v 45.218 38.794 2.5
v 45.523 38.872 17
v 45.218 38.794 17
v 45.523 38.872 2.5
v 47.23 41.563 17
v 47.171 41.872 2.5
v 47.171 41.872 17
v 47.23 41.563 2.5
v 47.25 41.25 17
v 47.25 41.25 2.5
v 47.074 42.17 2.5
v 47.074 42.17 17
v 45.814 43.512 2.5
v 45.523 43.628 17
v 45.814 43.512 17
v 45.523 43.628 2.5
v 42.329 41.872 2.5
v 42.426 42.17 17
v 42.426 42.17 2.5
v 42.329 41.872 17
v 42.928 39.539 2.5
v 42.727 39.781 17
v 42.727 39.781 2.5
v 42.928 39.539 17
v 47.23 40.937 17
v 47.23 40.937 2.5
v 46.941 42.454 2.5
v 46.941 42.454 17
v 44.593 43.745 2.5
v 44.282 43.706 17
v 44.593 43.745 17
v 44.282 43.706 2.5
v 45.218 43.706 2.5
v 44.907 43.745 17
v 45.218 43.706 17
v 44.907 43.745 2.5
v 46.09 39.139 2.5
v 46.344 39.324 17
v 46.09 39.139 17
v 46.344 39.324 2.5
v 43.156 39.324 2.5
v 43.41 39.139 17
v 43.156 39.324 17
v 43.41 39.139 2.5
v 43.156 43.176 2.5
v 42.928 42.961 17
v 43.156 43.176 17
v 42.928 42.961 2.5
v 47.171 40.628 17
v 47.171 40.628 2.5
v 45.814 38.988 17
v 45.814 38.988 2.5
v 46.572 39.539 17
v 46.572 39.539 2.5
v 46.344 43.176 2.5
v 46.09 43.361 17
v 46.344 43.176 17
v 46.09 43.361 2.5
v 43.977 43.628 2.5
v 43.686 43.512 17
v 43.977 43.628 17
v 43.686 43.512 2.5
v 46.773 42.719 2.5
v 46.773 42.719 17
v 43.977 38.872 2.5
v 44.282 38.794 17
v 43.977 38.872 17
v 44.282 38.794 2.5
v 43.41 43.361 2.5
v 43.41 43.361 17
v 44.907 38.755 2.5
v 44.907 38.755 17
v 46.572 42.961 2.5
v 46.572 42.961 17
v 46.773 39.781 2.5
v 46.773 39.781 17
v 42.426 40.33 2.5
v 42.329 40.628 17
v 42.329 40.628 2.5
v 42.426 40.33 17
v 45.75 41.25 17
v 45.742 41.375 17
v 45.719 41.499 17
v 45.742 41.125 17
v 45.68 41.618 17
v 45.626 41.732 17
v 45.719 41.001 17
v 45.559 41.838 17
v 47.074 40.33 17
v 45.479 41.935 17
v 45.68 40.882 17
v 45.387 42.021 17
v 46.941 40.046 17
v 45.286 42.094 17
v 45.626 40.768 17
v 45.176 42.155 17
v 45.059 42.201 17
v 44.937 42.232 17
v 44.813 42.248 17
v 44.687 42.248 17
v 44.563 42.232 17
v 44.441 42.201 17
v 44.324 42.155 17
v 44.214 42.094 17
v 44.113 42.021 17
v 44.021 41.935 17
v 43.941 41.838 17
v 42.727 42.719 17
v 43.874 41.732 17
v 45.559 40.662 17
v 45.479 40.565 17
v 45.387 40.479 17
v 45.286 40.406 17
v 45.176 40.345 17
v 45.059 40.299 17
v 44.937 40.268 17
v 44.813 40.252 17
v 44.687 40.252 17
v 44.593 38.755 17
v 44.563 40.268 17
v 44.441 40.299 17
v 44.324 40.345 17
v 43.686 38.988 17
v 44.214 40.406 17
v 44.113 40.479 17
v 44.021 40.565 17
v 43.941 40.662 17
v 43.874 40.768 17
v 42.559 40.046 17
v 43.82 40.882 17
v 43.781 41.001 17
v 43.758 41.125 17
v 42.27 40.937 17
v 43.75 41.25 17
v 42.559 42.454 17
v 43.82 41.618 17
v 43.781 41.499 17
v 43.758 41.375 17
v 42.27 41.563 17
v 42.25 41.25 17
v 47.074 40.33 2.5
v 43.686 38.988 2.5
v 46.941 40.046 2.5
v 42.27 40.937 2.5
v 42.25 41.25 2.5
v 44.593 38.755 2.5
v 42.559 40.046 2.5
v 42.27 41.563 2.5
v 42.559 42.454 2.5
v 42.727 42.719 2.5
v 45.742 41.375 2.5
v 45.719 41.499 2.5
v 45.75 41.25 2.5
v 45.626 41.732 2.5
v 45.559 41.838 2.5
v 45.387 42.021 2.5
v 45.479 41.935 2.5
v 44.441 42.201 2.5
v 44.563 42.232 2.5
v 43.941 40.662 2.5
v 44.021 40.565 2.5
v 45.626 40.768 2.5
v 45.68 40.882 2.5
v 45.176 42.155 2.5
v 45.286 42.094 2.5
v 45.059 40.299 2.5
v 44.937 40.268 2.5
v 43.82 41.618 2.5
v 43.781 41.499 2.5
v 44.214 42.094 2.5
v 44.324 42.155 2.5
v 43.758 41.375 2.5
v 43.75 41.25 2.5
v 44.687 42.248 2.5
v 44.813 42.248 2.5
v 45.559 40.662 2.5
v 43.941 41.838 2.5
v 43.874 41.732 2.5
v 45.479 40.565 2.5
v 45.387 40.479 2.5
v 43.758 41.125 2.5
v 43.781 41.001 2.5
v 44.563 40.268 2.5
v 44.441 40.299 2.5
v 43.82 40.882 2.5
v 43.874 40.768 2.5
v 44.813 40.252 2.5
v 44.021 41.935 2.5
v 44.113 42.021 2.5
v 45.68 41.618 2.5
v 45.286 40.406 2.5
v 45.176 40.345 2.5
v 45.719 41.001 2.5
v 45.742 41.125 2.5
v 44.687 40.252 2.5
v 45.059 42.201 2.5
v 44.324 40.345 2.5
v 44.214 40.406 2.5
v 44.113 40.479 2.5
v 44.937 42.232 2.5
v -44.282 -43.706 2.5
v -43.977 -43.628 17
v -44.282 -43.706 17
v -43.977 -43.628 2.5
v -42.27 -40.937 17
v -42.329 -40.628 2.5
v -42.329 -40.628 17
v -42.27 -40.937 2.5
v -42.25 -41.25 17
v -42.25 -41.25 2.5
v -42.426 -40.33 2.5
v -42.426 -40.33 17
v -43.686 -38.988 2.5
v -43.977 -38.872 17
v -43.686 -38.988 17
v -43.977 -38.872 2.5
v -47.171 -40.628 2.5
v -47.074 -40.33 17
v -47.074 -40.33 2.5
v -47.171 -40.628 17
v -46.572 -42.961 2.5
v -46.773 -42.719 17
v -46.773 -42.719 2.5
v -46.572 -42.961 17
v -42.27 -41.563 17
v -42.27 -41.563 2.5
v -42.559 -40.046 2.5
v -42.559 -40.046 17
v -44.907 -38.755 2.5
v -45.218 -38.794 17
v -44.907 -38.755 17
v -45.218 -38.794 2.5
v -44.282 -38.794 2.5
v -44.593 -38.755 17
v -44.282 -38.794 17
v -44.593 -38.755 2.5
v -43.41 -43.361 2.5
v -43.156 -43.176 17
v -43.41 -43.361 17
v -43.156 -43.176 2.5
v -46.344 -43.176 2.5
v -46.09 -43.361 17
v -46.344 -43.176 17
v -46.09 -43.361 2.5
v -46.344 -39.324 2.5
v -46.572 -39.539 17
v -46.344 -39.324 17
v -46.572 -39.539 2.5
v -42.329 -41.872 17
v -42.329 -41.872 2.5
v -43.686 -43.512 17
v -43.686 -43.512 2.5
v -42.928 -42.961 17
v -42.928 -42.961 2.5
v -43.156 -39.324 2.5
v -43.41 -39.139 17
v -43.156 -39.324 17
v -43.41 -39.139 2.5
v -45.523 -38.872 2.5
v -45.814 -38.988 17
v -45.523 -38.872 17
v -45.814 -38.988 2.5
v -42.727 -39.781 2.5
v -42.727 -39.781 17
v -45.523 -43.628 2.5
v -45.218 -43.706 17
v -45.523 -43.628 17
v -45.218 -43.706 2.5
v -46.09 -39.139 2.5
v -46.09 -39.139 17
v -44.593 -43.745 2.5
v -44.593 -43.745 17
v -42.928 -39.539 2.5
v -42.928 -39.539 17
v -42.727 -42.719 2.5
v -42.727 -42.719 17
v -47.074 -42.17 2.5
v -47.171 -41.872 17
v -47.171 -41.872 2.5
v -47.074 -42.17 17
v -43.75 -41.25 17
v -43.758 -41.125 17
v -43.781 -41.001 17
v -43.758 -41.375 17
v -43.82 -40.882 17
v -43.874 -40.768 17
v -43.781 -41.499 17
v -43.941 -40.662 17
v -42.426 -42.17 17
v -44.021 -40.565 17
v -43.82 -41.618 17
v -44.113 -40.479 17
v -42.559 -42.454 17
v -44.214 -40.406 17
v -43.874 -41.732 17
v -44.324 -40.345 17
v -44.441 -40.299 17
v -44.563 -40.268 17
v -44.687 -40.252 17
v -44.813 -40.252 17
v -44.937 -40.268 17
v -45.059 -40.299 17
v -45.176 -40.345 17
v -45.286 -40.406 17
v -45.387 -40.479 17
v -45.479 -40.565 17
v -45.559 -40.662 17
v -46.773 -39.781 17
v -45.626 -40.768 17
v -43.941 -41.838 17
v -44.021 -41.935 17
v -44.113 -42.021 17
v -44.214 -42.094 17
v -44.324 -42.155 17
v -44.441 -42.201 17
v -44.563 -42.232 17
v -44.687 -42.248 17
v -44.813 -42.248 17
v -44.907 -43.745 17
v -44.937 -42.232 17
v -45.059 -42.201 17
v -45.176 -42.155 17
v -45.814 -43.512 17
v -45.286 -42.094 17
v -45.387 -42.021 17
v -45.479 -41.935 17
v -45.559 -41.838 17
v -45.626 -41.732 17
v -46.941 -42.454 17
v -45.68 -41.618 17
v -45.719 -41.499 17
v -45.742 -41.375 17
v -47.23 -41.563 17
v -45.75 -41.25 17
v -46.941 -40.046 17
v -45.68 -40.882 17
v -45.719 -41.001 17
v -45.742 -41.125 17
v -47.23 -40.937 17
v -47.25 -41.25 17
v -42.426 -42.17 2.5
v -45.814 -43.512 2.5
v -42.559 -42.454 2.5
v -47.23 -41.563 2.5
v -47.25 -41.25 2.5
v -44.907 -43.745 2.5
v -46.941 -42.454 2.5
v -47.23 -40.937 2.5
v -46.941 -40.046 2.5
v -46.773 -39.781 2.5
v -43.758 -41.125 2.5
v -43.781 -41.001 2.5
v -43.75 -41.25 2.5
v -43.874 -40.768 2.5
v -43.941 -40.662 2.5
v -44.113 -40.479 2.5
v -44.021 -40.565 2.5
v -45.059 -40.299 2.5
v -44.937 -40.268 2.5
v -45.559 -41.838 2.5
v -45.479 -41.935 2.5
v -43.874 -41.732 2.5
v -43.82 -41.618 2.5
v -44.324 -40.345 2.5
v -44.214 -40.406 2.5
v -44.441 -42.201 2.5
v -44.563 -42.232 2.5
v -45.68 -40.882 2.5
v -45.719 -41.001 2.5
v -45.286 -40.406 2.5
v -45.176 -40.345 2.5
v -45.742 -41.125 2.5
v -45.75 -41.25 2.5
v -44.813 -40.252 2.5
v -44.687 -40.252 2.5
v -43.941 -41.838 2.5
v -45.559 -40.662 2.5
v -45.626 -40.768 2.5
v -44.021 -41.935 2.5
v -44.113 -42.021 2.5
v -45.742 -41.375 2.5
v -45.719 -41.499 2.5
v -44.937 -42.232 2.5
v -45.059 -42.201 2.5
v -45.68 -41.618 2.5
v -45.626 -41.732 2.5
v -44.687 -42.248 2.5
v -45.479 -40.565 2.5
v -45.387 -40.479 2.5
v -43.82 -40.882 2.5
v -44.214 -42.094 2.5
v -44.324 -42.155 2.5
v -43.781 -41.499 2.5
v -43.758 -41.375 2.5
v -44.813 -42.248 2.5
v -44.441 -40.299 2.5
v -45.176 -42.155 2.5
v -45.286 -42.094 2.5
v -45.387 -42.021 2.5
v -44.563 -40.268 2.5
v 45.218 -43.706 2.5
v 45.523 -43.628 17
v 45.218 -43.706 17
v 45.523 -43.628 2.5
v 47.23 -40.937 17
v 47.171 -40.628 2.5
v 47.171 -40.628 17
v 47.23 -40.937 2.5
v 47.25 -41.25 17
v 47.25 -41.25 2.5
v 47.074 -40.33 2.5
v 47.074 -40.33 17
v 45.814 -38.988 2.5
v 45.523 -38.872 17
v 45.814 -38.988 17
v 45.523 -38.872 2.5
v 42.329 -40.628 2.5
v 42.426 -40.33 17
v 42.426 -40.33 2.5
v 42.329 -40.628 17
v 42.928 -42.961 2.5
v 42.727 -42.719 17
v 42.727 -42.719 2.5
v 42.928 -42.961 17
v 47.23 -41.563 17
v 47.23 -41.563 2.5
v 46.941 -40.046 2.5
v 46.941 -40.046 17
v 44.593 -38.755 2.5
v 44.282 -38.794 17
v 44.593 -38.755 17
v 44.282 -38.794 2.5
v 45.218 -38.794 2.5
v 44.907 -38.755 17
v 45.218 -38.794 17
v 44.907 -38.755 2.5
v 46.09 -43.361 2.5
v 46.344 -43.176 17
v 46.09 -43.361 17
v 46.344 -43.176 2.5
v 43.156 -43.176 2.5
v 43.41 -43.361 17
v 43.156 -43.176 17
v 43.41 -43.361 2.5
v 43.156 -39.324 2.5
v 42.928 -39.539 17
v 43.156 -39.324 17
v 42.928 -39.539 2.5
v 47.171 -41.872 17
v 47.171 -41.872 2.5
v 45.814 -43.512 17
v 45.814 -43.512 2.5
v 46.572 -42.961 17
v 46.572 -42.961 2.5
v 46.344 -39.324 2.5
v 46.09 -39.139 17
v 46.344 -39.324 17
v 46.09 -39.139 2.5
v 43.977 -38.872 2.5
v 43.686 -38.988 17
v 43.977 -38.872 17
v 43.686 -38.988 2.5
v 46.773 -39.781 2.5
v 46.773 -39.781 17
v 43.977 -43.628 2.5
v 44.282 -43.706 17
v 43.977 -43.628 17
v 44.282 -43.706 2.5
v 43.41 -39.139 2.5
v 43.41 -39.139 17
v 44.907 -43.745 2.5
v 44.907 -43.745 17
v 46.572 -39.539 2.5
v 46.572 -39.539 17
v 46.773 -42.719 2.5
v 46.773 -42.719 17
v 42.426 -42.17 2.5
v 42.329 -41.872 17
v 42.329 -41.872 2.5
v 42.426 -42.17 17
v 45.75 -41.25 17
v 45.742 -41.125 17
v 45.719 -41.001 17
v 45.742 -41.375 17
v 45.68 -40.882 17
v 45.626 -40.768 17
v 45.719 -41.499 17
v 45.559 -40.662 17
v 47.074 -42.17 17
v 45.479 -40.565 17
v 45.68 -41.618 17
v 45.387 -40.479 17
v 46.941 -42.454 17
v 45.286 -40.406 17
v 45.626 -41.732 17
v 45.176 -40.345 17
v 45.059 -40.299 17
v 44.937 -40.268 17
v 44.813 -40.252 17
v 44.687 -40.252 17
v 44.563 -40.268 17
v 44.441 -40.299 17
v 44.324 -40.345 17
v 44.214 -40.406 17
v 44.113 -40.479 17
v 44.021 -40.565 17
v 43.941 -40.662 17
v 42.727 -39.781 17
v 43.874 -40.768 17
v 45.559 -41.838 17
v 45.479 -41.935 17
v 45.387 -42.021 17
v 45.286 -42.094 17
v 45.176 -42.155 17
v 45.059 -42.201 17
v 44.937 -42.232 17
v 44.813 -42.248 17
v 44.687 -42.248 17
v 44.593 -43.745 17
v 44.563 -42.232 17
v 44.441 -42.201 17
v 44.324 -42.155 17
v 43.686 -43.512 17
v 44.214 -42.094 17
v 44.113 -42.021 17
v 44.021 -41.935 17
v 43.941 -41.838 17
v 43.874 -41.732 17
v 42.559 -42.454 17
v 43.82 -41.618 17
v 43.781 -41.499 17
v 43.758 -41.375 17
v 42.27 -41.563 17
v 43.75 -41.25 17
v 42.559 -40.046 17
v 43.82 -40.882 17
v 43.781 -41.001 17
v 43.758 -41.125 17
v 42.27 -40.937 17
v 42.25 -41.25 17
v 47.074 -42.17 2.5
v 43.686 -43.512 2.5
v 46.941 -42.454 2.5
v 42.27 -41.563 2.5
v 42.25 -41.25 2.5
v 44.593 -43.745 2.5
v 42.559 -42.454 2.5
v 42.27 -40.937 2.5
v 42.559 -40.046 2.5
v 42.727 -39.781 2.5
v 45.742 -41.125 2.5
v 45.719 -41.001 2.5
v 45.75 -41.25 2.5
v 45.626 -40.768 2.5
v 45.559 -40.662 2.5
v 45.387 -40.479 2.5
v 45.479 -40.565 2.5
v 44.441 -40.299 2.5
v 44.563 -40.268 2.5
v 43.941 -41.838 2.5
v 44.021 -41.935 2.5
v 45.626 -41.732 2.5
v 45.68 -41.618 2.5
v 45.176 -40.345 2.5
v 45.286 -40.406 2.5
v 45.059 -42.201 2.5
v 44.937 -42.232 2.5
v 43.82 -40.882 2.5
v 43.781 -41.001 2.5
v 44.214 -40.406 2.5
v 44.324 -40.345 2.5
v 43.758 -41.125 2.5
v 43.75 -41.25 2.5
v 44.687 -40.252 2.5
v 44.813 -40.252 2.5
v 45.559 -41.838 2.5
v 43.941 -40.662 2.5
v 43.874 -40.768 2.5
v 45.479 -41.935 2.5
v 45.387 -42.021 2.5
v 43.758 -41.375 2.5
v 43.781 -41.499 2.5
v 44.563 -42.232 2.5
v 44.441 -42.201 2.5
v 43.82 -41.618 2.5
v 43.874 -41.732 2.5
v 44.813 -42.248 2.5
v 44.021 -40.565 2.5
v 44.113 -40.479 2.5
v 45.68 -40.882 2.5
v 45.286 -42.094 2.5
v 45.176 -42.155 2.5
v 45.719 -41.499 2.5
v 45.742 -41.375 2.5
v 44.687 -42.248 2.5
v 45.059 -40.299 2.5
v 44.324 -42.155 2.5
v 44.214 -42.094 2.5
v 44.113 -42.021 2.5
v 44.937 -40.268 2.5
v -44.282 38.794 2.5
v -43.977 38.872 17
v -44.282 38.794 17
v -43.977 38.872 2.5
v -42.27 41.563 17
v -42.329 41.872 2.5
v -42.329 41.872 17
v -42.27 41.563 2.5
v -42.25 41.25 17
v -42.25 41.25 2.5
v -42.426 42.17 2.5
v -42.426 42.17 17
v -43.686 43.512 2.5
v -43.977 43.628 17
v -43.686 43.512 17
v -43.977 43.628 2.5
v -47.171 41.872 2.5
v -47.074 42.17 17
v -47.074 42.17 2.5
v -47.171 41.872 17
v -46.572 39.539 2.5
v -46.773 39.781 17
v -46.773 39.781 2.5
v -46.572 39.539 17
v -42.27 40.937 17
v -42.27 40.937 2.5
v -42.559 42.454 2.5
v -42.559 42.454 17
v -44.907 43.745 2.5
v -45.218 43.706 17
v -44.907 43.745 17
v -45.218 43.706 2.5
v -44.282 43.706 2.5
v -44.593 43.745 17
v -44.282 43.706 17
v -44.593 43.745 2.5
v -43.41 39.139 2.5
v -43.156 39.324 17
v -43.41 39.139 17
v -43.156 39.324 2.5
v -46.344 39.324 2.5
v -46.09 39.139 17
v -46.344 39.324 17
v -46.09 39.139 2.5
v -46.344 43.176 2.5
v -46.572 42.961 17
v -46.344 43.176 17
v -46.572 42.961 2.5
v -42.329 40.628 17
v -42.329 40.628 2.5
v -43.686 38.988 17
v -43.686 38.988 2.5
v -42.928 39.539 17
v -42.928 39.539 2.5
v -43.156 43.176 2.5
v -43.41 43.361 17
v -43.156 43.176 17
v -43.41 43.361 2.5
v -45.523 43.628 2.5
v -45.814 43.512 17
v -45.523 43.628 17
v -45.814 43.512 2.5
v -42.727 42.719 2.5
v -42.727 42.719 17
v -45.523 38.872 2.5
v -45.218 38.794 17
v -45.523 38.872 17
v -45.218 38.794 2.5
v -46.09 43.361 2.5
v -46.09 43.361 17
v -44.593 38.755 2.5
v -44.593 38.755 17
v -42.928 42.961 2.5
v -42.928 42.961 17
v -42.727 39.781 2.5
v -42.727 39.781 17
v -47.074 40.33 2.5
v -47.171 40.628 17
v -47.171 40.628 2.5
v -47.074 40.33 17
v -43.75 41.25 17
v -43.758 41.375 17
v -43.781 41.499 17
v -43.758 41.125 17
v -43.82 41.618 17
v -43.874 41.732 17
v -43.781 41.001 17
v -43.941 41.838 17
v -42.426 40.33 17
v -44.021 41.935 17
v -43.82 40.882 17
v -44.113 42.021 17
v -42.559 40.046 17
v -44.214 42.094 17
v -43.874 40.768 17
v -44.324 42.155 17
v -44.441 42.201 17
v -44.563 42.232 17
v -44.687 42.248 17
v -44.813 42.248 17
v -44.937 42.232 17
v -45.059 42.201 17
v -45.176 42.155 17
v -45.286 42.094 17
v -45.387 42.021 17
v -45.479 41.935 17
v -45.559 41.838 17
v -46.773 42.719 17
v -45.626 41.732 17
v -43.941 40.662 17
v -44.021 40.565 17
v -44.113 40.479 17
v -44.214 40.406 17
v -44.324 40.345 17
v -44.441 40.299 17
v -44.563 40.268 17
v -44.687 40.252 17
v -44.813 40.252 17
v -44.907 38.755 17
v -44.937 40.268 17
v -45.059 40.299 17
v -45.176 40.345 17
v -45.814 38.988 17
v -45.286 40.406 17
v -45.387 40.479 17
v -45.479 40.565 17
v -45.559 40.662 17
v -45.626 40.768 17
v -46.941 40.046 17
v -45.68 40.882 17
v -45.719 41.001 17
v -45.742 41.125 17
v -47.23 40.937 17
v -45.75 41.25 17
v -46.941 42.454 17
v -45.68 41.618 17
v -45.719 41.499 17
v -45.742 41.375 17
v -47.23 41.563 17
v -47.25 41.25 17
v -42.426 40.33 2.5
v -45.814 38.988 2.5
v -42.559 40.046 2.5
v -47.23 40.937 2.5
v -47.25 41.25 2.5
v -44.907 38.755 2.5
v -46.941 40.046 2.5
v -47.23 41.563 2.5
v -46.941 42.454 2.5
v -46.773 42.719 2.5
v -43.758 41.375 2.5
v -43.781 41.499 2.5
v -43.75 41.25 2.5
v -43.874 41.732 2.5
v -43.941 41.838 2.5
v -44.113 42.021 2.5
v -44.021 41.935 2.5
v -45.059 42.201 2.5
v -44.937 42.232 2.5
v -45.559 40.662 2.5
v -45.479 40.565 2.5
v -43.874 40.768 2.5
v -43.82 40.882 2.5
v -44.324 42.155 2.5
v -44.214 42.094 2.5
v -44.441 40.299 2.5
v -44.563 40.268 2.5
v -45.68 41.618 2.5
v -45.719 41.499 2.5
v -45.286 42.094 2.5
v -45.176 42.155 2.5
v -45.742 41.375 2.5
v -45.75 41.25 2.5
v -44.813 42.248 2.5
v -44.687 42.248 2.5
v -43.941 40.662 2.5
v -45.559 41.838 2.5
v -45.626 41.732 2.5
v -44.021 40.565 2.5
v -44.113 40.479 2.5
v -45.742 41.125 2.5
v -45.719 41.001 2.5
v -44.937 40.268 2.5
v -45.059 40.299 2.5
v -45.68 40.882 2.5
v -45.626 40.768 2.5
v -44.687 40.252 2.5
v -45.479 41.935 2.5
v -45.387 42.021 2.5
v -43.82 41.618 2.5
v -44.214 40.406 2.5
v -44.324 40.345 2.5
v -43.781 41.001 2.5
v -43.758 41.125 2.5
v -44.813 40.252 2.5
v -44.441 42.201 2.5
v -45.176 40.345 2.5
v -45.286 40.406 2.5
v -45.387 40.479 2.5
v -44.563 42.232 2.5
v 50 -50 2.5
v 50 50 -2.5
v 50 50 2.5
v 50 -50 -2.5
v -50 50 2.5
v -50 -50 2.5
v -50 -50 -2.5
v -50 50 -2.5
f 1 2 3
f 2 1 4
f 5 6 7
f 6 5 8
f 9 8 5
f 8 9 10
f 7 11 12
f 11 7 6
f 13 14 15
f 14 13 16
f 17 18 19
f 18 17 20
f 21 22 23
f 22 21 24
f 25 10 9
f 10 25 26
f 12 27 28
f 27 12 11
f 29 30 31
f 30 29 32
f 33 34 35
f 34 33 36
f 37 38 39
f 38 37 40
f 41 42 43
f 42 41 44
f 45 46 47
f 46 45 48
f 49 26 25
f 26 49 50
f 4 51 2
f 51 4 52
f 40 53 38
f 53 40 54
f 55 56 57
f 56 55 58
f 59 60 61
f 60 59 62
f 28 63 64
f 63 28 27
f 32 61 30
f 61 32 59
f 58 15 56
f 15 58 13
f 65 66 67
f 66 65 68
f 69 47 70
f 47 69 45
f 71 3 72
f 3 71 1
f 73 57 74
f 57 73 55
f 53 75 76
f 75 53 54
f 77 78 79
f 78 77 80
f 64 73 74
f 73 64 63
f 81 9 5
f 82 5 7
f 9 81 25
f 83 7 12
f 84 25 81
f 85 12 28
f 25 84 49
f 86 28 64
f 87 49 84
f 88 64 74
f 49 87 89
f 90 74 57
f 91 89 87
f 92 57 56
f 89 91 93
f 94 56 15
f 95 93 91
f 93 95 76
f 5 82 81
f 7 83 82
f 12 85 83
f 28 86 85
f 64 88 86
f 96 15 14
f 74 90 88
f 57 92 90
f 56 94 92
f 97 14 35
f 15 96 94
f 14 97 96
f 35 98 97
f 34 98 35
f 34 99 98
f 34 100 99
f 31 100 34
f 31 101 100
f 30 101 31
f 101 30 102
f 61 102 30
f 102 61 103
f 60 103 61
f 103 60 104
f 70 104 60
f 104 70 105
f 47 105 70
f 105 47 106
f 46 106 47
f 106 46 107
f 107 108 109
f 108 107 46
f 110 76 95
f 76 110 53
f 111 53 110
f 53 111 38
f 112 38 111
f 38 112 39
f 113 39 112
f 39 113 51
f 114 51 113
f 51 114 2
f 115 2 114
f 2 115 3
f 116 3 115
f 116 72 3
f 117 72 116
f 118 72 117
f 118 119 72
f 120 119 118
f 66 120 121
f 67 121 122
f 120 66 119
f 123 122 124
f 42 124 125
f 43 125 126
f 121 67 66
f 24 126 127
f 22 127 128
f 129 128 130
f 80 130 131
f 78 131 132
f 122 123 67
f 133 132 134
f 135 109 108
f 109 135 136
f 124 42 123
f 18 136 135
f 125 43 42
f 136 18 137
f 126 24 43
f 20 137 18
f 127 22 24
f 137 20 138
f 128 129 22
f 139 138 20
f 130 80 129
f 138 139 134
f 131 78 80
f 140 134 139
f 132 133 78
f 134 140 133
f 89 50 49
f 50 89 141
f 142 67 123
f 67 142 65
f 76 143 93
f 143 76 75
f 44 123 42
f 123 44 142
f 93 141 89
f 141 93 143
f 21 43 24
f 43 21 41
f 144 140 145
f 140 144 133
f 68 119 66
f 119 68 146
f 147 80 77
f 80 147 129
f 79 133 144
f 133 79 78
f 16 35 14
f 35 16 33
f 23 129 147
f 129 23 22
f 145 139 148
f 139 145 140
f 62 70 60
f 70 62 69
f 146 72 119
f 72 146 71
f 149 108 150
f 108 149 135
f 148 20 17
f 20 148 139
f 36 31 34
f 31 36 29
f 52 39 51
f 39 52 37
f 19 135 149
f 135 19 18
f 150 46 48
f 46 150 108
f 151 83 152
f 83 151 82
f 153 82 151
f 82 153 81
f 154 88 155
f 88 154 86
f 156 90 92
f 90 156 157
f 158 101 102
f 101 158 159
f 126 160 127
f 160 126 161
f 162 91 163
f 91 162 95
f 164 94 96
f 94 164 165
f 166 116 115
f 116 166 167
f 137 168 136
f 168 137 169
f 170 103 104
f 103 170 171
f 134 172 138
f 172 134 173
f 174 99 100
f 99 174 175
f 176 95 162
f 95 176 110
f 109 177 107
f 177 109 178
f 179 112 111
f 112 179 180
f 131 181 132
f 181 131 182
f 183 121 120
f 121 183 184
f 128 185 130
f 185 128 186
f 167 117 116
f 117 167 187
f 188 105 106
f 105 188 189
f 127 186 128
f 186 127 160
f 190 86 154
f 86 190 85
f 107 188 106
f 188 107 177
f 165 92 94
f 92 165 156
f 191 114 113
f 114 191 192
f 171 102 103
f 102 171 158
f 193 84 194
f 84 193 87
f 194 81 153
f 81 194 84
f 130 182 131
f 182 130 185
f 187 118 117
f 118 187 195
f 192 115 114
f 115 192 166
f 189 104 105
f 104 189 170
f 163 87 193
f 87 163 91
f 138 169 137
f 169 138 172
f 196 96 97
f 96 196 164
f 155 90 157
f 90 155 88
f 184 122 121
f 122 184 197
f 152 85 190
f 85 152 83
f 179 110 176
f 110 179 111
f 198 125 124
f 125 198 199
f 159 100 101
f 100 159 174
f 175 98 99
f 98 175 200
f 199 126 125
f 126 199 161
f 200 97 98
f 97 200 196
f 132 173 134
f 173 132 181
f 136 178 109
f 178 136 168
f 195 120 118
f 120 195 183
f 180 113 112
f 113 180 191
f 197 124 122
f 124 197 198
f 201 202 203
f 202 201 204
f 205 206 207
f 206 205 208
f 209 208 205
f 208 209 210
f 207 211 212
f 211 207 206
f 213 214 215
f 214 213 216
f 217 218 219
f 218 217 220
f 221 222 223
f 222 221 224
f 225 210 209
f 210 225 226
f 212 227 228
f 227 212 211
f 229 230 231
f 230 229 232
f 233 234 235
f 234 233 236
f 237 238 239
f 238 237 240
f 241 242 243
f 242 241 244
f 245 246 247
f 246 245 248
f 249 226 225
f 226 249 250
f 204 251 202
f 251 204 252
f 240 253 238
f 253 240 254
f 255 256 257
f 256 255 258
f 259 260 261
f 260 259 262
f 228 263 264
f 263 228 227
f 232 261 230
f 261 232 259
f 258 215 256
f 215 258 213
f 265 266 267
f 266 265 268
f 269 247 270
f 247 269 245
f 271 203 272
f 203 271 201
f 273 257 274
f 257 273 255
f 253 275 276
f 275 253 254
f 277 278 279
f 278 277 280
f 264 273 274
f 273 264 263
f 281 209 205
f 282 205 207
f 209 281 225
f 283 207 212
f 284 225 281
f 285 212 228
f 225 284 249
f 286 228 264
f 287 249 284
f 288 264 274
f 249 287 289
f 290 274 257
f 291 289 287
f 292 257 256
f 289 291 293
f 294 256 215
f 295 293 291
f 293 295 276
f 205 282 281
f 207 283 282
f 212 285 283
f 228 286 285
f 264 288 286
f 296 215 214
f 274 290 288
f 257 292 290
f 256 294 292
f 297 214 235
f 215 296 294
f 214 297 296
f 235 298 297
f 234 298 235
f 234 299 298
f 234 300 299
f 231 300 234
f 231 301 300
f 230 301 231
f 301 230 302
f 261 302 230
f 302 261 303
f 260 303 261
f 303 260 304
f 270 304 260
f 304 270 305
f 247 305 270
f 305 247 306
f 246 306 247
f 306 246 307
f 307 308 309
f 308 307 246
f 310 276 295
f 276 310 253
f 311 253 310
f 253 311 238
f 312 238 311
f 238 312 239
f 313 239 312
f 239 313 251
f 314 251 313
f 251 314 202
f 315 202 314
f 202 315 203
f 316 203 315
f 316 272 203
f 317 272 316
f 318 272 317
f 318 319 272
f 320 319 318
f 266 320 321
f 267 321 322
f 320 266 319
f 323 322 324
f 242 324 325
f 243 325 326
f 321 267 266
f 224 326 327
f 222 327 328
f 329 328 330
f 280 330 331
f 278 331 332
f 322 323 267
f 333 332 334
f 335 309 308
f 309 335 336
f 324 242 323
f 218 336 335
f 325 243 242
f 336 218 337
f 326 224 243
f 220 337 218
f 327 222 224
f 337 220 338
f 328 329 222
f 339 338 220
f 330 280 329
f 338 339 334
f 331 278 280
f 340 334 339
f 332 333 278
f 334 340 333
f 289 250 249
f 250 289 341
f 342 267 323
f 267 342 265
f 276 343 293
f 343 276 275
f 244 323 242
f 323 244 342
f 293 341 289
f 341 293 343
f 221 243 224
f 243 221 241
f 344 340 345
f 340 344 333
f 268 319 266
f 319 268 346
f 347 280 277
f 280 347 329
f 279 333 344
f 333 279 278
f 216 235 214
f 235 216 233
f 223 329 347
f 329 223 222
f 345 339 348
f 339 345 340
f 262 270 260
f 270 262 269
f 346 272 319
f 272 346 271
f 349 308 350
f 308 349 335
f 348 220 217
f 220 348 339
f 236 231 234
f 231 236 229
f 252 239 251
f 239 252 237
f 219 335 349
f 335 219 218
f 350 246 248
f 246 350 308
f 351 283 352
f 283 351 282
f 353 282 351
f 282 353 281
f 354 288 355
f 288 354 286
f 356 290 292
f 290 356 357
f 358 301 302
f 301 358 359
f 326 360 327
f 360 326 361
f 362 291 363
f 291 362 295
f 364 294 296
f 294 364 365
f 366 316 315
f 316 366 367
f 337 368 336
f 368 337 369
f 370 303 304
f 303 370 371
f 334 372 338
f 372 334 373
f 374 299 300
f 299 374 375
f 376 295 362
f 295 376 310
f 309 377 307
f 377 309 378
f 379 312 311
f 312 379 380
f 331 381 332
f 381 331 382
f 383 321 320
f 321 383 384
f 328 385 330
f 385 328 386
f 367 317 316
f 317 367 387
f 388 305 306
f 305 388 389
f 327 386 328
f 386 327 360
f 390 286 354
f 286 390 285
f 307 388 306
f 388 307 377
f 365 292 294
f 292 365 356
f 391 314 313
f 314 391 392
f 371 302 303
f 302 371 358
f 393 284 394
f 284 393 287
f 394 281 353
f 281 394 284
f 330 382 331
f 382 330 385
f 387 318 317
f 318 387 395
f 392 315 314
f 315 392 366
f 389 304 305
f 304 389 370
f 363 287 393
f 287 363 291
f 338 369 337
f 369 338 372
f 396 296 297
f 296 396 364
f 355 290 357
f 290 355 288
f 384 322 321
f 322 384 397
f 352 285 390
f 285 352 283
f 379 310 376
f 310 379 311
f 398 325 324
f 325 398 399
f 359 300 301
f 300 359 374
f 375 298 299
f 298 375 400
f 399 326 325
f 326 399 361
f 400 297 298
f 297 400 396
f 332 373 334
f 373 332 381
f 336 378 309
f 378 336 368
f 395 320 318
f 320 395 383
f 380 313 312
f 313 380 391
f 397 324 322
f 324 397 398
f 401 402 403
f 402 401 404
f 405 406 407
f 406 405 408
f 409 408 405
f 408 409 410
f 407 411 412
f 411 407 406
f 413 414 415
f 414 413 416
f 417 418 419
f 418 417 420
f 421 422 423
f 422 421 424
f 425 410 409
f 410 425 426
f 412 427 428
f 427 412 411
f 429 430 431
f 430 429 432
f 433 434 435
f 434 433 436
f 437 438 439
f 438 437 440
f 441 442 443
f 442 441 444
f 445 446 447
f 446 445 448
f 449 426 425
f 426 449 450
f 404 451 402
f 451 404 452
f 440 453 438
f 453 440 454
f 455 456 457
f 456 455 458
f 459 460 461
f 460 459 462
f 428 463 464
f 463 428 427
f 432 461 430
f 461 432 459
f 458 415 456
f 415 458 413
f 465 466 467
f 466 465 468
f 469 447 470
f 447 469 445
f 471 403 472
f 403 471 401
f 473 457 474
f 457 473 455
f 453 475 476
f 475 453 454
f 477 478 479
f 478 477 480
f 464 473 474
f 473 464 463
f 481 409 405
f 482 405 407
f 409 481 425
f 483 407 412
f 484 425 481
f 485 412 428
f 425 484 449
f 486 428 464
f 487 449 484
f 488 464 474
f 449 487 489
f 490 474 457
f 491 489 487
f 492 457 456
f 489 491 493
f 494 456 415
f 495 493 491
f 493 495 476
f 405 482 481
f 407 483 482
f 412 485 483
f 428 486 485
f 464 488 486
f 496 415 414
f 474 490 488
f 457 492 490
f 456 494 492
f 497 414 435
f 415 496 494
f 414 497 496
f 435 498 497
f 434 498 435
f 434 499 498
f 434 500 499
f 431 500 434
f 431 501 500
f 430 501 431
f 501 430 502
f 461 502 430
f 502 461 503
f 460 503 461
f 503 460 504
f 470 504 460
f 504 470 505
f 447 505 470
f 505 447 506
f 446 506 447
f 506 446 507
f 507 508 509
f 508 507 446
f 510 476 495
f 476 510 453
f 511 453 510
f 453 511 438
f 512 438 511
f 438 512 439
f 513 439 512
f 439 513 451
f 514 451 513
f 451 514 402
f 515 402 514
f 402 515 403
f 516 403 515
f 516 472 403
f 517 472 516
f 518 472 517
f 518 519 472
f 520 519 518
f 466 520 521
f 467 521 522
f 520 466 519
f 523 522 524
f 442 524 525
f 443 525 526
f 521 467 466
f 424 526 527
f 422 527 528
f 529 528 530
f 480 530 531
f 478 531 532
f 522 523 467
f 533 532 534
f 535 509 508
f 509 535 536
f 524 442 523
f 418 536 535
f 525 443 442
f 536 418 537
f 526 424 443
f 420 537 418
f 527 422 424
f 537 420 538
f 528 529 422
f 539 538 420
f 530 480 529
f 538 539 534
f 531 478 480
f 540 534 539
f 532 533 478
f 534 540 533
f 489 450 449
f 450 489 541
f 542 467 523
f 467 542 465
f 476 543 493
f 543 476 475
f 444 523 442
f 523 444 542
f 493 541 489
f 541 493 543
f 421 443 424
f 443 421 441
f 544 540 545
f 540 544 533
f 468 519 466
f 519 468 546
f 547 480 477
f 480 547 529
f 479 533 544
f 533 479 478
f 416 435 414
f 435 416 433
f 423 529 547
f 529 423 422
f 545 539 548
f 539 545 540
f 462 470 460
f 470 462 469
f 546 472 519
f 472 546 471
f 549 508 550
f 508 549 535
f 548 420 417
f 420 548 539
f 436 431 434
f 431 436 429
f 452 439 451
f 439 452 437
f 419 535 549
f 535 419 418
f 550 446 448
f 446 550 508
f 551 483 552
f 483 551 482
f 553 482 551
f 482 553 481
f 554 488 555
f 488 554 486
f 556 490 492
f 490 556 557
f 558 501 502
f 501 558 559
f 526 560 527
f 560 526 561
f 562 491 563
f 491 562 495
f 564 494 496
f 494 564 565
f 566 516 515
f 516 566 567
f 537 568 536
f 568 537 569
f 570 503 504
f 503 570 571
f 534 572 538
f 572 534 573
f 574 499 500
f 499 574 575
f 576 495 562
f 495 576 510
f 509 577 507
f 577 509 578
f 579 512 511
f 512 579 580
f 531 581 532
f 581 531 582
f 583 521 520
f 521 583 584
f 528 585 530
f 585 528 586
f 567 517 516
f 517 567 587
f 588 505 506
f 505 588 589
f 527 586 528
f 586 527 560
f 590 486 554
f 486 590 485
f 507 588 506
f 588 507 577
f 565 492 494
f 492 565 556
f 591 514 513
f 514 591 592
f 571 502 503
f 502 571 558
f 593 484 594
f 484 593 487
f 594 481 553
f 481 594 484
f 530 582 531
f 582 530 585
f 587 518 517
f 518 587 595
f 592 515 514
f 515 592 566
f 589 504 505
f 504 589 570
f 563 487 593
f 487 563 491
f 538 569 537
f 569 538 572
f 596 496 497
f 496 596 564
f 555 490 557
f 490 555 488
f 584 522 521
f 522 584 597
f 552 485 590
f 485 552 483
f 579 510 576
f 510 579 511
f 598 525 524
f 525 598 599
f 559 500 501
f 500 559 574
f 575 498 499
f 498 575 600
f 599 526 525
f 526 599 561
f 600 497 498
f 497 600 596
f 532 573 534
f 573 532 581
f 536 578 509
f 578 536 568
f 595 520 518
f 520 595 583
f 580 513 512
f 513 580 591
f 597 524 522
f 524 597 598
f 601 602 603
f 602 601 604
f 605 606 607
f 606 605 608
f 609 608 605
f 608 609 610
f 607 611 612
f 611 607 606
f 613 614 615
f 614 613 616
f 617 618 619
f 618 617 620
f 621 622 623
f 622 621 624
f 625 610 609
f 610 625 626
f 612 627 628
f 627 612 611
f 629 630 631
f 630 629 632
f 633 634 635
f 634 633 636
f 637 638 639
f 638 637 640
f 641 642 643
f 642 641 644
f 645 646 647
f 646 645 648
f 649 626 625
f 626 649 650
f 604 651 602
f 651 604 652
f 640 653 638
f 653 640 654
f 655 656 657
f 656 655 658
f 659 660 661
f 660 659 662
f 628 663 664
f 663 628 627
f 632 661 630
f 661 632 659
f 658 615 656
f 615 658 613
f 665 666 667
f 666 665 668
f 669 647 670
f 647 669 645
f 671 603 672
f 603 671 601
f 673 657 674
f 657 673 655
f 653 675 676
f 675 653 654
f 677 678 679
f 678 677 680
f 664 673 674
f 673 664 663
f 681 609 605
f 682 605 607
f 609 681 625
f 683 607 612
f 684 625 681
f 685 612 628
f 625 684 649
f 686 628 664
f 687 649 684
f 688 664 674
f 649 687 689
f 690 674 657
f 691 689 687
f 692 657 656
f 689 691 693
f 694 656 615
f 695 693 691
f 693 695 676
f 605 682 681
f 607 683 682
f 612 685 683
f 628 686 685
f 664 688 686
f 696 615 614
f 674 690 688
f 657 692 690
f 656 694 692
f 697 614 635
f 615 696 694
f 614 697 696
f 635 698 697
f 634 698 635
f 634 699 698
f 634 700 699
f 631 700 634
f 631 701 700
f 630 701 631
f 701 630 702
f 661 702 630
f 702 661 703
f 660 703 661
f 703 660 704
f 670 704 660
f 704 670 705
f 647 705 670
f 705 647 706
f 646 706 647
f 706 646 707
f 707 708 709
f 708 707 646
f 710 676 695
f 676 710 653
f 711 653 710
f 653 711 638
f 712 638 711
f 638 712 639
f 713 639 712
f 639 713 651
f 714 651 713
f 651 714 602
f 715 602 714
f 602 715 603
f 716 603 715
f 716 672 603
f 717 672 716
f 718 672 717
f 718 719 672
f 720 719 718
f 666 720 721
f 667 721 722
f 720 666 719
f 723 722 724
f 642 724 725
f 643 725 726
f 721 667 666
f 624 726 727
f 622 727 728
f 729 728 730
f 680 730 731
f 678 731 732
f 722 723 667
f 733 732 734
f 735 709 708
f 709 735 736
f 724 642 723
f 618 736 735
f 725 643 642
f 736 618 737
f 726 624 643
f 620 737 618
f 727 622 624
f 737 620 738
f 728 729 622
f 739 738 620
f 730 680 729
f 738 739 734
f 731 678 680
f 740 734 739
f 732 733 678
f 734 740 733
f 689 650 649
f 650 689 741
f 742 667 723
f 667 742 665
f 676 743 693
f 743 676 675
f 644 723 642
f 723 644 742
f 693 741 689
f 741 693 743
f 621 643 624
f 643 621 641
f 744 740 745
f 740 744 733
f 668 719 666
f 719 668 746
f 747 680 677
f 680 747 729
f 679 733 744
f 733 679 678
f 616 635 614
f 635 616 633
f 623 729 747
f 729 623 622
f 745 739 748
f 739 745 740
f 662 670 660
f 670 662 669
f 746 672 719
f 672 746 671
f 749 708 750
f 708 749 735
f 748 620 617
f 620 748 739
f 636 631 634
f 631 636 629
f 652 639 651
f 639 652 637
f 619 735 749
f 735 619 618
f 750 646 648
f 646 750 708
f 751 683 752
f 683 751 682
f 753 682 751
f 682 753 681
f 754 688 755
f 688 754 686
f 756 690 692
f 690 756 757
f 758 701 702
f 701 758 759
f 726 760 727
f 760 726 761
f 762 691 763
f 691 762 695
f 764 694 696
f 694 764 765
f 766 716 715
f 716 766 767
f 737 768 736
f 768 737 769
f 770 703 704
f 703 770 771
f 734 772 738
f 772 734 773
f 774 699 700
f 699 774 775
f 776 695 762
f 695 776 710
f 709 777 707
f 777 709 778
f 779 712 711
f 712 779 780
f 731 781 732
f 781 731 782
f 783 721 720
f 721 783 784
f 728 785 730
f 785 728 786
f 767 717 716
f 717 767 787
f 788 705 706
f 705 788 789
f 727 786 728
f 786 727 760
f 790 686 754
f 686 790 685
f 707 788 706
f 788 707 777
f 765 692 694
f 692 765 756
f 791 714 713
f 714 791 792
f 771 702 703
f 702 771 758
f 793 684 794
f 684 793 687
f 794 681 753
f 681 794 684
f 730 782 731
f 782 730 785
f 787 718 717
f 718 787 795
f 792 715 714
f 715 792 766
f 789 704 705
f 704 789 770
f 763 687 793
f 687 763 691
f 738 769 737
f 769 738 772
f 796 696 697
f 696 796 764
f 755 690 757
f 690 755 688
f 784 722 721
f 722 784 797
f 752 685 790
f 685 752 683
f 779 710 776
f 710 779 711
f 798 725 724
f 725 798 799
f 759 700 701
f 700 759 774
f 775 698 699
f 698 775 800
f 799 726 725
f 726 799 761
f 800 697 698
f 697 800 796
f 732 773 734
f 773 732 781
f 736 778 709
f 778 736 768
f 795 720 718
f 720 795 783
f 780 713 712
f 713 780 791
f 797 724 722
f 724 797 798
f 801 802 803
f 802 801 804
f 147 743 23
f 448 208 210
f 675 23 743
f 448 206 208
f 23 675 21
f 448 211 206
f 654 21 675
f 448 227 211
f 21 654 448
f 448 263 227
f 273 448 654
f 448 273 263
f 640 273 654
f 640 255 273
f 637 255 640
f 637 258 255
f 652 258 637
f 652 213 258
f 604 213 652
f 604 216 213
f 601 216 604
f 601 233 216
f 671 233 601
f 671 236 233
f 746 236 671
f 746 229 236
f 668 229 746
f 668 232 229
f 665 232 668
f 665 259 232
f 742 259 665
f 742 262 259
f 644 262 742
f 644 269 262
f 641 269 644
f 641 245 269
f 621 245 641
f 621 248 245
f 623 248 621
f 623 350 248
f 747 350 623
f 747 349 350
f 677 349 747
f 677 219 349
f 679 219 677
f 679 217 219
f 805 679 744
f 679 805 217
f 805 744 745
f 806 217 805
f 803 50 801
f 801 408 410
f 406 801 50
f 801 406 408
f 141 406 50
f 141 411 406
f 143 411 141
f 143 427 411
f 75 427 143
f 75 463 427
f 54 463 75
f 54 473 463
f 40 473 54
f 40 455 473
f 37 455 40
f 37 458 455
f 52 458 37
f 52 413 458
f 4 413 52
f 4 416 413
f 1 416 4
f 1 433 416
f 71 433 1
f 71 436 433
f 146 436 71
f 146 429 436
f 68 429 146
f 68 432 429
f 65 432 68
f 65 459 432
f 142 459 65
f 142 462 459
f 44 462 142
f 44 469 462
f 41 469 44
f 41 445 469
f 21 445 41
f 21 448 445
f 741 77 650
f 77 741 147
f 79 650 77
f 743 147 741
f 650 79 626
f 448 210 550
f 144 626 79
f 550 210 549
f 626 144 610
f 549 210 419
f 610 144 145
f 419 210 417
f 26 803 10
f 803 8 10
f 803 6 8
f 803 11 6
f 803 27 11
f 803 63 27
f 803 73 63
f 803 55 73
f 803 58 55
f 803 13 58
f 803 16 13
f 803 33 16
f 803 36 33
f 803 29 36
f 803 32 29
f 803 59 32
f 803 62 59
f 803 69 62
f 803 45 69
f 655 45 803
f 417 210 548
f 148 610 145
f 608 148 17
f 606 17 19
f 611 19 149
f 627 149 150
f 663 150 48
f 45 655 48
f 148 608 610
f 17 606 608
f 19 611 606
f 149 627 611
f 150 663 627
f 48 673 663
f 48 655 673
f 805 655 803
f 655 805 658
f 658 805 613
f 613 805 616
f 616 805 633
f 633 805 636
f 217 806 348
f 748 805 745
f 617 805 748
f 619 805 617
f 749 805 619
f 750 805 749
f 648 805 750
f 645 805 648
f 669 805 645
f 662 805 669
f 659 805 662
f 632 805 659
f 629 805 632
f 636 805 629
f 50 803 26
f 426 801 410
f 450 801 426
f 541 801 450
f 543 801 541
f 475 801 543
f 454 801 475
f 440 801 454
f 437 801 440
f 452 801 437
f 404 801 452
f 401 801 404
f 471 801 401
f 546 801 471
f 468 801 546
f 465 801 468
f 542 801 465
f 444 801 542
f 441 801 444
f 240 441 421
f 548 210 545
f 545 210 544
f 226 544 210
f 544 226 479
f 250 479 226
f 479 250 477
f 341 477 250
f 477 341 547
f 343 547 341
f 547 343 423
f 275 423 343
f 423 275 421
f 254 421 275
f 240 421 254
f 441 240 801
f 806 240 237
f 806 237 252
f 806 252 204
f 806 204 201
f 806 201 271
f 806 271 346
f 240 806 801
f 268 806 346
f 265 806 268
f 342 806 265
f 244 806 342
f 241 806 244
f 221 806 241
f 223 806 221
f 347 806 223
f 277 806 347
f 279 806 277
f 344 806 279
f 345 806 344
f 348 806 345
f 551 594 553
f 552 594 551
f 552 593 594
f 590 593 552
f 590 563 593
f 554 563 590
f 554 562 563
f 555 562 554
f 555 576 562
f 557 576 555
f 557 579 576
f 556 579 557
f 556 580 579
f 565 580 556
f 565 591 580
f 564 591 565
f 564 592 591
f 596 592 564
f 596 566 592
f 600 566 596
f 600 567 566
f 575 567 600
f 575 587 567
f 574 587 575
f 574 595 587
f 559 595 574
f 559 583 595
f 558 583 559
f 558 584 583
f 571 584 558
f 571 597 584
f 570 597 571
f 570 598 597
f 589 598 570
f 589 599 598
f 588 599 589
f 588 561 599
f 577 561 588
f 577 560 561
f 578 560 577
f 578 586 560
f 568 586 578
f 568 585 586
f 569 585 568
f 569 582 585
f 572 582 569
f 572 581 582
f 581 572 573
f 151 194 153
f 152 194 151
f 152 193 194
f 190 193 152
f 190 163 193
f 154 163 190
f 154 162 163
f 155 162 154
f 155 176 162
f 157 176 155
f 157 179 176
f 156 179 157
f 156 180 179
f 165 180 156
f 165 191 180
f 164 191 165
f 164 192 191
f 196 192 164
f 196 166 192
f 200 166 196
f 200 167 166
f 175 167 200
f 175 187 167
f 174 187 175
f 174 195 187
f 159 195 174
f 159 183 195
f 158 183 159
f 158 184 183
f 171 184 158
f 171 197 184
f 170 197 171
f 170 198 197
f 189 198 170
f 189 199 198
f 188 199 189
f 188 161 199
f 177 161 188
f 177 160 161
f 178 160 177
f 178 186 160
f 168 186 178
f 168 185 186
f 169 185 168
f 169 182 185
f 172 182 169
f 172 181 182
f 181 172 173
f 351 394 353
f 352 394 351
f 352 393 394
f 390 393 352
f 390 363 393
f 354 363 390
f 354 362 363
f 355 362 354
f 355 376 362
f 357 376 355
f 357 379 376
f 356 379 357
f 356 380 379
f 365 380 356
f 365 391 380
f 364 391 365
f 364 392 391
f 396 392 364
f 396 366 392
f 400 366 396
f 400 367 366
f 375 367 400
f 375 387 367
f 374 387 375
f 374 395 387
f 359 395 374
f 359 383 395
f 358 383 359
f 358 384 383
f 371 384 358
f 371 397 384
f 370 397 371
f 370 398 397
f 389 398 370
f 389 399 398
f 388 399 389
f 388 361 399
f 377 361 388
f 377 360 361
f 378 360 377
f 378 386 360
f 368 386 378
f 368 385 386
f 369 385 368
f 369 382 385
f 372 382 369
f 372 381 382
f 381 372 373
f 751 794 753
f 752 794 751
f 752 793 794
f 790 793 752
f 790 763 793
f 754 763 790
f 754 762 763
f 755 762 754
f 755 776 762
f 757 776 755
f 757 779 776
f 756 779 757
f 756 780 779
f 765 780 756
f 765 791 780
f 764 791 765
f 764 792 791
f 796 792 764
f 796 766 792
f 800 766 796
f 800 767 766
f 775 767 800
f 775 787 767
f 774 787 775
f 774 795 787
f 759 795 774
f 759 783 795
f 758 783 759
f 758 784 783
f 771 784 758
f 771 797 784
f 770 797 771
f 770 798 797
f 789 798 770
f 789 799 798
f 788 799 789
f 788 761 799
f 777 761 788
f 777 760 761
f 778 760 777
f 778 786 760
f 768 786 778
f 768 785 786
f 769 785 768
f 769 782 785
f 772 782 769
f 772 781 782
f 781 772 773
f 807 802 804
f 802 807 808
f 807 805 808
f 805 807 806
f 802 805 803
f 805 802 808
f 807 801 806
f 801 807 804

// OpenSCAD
$fn = 50;

base = [100, 100, 5];
hole_spacing = [89.5/2, 82.5/2];
hole_inner = 2;
hole_outer = 5;
post_height = 17;


translate(hole_spacing) {
    difference() {
        cylinder(h = post_height, d = hole_outer);
        cylinder(h = post_height, d = hole_inner);
    }
}

translate(-hole_spacing) {
    difference() {
        cylinder(h = post_height, d = hole_outer);
        cylinder(h = post_height, d = hole_inner);
    }
}

translate([hole_spacing.x, -hole_spacing.y]) {
    difference() {
        cylinder(h = post_height, d = hole_outer);
        cylinder(h = post_height, d = hole_inner);
    }
}

translate([-hole_spacing.x, hole_spacing.y]) {
    difference() {
        cylinder(h = post_height, d = hole_outer);
        cylinder(h = post_height, d = hole_inner);
    }
}

cube(base, center = true);
